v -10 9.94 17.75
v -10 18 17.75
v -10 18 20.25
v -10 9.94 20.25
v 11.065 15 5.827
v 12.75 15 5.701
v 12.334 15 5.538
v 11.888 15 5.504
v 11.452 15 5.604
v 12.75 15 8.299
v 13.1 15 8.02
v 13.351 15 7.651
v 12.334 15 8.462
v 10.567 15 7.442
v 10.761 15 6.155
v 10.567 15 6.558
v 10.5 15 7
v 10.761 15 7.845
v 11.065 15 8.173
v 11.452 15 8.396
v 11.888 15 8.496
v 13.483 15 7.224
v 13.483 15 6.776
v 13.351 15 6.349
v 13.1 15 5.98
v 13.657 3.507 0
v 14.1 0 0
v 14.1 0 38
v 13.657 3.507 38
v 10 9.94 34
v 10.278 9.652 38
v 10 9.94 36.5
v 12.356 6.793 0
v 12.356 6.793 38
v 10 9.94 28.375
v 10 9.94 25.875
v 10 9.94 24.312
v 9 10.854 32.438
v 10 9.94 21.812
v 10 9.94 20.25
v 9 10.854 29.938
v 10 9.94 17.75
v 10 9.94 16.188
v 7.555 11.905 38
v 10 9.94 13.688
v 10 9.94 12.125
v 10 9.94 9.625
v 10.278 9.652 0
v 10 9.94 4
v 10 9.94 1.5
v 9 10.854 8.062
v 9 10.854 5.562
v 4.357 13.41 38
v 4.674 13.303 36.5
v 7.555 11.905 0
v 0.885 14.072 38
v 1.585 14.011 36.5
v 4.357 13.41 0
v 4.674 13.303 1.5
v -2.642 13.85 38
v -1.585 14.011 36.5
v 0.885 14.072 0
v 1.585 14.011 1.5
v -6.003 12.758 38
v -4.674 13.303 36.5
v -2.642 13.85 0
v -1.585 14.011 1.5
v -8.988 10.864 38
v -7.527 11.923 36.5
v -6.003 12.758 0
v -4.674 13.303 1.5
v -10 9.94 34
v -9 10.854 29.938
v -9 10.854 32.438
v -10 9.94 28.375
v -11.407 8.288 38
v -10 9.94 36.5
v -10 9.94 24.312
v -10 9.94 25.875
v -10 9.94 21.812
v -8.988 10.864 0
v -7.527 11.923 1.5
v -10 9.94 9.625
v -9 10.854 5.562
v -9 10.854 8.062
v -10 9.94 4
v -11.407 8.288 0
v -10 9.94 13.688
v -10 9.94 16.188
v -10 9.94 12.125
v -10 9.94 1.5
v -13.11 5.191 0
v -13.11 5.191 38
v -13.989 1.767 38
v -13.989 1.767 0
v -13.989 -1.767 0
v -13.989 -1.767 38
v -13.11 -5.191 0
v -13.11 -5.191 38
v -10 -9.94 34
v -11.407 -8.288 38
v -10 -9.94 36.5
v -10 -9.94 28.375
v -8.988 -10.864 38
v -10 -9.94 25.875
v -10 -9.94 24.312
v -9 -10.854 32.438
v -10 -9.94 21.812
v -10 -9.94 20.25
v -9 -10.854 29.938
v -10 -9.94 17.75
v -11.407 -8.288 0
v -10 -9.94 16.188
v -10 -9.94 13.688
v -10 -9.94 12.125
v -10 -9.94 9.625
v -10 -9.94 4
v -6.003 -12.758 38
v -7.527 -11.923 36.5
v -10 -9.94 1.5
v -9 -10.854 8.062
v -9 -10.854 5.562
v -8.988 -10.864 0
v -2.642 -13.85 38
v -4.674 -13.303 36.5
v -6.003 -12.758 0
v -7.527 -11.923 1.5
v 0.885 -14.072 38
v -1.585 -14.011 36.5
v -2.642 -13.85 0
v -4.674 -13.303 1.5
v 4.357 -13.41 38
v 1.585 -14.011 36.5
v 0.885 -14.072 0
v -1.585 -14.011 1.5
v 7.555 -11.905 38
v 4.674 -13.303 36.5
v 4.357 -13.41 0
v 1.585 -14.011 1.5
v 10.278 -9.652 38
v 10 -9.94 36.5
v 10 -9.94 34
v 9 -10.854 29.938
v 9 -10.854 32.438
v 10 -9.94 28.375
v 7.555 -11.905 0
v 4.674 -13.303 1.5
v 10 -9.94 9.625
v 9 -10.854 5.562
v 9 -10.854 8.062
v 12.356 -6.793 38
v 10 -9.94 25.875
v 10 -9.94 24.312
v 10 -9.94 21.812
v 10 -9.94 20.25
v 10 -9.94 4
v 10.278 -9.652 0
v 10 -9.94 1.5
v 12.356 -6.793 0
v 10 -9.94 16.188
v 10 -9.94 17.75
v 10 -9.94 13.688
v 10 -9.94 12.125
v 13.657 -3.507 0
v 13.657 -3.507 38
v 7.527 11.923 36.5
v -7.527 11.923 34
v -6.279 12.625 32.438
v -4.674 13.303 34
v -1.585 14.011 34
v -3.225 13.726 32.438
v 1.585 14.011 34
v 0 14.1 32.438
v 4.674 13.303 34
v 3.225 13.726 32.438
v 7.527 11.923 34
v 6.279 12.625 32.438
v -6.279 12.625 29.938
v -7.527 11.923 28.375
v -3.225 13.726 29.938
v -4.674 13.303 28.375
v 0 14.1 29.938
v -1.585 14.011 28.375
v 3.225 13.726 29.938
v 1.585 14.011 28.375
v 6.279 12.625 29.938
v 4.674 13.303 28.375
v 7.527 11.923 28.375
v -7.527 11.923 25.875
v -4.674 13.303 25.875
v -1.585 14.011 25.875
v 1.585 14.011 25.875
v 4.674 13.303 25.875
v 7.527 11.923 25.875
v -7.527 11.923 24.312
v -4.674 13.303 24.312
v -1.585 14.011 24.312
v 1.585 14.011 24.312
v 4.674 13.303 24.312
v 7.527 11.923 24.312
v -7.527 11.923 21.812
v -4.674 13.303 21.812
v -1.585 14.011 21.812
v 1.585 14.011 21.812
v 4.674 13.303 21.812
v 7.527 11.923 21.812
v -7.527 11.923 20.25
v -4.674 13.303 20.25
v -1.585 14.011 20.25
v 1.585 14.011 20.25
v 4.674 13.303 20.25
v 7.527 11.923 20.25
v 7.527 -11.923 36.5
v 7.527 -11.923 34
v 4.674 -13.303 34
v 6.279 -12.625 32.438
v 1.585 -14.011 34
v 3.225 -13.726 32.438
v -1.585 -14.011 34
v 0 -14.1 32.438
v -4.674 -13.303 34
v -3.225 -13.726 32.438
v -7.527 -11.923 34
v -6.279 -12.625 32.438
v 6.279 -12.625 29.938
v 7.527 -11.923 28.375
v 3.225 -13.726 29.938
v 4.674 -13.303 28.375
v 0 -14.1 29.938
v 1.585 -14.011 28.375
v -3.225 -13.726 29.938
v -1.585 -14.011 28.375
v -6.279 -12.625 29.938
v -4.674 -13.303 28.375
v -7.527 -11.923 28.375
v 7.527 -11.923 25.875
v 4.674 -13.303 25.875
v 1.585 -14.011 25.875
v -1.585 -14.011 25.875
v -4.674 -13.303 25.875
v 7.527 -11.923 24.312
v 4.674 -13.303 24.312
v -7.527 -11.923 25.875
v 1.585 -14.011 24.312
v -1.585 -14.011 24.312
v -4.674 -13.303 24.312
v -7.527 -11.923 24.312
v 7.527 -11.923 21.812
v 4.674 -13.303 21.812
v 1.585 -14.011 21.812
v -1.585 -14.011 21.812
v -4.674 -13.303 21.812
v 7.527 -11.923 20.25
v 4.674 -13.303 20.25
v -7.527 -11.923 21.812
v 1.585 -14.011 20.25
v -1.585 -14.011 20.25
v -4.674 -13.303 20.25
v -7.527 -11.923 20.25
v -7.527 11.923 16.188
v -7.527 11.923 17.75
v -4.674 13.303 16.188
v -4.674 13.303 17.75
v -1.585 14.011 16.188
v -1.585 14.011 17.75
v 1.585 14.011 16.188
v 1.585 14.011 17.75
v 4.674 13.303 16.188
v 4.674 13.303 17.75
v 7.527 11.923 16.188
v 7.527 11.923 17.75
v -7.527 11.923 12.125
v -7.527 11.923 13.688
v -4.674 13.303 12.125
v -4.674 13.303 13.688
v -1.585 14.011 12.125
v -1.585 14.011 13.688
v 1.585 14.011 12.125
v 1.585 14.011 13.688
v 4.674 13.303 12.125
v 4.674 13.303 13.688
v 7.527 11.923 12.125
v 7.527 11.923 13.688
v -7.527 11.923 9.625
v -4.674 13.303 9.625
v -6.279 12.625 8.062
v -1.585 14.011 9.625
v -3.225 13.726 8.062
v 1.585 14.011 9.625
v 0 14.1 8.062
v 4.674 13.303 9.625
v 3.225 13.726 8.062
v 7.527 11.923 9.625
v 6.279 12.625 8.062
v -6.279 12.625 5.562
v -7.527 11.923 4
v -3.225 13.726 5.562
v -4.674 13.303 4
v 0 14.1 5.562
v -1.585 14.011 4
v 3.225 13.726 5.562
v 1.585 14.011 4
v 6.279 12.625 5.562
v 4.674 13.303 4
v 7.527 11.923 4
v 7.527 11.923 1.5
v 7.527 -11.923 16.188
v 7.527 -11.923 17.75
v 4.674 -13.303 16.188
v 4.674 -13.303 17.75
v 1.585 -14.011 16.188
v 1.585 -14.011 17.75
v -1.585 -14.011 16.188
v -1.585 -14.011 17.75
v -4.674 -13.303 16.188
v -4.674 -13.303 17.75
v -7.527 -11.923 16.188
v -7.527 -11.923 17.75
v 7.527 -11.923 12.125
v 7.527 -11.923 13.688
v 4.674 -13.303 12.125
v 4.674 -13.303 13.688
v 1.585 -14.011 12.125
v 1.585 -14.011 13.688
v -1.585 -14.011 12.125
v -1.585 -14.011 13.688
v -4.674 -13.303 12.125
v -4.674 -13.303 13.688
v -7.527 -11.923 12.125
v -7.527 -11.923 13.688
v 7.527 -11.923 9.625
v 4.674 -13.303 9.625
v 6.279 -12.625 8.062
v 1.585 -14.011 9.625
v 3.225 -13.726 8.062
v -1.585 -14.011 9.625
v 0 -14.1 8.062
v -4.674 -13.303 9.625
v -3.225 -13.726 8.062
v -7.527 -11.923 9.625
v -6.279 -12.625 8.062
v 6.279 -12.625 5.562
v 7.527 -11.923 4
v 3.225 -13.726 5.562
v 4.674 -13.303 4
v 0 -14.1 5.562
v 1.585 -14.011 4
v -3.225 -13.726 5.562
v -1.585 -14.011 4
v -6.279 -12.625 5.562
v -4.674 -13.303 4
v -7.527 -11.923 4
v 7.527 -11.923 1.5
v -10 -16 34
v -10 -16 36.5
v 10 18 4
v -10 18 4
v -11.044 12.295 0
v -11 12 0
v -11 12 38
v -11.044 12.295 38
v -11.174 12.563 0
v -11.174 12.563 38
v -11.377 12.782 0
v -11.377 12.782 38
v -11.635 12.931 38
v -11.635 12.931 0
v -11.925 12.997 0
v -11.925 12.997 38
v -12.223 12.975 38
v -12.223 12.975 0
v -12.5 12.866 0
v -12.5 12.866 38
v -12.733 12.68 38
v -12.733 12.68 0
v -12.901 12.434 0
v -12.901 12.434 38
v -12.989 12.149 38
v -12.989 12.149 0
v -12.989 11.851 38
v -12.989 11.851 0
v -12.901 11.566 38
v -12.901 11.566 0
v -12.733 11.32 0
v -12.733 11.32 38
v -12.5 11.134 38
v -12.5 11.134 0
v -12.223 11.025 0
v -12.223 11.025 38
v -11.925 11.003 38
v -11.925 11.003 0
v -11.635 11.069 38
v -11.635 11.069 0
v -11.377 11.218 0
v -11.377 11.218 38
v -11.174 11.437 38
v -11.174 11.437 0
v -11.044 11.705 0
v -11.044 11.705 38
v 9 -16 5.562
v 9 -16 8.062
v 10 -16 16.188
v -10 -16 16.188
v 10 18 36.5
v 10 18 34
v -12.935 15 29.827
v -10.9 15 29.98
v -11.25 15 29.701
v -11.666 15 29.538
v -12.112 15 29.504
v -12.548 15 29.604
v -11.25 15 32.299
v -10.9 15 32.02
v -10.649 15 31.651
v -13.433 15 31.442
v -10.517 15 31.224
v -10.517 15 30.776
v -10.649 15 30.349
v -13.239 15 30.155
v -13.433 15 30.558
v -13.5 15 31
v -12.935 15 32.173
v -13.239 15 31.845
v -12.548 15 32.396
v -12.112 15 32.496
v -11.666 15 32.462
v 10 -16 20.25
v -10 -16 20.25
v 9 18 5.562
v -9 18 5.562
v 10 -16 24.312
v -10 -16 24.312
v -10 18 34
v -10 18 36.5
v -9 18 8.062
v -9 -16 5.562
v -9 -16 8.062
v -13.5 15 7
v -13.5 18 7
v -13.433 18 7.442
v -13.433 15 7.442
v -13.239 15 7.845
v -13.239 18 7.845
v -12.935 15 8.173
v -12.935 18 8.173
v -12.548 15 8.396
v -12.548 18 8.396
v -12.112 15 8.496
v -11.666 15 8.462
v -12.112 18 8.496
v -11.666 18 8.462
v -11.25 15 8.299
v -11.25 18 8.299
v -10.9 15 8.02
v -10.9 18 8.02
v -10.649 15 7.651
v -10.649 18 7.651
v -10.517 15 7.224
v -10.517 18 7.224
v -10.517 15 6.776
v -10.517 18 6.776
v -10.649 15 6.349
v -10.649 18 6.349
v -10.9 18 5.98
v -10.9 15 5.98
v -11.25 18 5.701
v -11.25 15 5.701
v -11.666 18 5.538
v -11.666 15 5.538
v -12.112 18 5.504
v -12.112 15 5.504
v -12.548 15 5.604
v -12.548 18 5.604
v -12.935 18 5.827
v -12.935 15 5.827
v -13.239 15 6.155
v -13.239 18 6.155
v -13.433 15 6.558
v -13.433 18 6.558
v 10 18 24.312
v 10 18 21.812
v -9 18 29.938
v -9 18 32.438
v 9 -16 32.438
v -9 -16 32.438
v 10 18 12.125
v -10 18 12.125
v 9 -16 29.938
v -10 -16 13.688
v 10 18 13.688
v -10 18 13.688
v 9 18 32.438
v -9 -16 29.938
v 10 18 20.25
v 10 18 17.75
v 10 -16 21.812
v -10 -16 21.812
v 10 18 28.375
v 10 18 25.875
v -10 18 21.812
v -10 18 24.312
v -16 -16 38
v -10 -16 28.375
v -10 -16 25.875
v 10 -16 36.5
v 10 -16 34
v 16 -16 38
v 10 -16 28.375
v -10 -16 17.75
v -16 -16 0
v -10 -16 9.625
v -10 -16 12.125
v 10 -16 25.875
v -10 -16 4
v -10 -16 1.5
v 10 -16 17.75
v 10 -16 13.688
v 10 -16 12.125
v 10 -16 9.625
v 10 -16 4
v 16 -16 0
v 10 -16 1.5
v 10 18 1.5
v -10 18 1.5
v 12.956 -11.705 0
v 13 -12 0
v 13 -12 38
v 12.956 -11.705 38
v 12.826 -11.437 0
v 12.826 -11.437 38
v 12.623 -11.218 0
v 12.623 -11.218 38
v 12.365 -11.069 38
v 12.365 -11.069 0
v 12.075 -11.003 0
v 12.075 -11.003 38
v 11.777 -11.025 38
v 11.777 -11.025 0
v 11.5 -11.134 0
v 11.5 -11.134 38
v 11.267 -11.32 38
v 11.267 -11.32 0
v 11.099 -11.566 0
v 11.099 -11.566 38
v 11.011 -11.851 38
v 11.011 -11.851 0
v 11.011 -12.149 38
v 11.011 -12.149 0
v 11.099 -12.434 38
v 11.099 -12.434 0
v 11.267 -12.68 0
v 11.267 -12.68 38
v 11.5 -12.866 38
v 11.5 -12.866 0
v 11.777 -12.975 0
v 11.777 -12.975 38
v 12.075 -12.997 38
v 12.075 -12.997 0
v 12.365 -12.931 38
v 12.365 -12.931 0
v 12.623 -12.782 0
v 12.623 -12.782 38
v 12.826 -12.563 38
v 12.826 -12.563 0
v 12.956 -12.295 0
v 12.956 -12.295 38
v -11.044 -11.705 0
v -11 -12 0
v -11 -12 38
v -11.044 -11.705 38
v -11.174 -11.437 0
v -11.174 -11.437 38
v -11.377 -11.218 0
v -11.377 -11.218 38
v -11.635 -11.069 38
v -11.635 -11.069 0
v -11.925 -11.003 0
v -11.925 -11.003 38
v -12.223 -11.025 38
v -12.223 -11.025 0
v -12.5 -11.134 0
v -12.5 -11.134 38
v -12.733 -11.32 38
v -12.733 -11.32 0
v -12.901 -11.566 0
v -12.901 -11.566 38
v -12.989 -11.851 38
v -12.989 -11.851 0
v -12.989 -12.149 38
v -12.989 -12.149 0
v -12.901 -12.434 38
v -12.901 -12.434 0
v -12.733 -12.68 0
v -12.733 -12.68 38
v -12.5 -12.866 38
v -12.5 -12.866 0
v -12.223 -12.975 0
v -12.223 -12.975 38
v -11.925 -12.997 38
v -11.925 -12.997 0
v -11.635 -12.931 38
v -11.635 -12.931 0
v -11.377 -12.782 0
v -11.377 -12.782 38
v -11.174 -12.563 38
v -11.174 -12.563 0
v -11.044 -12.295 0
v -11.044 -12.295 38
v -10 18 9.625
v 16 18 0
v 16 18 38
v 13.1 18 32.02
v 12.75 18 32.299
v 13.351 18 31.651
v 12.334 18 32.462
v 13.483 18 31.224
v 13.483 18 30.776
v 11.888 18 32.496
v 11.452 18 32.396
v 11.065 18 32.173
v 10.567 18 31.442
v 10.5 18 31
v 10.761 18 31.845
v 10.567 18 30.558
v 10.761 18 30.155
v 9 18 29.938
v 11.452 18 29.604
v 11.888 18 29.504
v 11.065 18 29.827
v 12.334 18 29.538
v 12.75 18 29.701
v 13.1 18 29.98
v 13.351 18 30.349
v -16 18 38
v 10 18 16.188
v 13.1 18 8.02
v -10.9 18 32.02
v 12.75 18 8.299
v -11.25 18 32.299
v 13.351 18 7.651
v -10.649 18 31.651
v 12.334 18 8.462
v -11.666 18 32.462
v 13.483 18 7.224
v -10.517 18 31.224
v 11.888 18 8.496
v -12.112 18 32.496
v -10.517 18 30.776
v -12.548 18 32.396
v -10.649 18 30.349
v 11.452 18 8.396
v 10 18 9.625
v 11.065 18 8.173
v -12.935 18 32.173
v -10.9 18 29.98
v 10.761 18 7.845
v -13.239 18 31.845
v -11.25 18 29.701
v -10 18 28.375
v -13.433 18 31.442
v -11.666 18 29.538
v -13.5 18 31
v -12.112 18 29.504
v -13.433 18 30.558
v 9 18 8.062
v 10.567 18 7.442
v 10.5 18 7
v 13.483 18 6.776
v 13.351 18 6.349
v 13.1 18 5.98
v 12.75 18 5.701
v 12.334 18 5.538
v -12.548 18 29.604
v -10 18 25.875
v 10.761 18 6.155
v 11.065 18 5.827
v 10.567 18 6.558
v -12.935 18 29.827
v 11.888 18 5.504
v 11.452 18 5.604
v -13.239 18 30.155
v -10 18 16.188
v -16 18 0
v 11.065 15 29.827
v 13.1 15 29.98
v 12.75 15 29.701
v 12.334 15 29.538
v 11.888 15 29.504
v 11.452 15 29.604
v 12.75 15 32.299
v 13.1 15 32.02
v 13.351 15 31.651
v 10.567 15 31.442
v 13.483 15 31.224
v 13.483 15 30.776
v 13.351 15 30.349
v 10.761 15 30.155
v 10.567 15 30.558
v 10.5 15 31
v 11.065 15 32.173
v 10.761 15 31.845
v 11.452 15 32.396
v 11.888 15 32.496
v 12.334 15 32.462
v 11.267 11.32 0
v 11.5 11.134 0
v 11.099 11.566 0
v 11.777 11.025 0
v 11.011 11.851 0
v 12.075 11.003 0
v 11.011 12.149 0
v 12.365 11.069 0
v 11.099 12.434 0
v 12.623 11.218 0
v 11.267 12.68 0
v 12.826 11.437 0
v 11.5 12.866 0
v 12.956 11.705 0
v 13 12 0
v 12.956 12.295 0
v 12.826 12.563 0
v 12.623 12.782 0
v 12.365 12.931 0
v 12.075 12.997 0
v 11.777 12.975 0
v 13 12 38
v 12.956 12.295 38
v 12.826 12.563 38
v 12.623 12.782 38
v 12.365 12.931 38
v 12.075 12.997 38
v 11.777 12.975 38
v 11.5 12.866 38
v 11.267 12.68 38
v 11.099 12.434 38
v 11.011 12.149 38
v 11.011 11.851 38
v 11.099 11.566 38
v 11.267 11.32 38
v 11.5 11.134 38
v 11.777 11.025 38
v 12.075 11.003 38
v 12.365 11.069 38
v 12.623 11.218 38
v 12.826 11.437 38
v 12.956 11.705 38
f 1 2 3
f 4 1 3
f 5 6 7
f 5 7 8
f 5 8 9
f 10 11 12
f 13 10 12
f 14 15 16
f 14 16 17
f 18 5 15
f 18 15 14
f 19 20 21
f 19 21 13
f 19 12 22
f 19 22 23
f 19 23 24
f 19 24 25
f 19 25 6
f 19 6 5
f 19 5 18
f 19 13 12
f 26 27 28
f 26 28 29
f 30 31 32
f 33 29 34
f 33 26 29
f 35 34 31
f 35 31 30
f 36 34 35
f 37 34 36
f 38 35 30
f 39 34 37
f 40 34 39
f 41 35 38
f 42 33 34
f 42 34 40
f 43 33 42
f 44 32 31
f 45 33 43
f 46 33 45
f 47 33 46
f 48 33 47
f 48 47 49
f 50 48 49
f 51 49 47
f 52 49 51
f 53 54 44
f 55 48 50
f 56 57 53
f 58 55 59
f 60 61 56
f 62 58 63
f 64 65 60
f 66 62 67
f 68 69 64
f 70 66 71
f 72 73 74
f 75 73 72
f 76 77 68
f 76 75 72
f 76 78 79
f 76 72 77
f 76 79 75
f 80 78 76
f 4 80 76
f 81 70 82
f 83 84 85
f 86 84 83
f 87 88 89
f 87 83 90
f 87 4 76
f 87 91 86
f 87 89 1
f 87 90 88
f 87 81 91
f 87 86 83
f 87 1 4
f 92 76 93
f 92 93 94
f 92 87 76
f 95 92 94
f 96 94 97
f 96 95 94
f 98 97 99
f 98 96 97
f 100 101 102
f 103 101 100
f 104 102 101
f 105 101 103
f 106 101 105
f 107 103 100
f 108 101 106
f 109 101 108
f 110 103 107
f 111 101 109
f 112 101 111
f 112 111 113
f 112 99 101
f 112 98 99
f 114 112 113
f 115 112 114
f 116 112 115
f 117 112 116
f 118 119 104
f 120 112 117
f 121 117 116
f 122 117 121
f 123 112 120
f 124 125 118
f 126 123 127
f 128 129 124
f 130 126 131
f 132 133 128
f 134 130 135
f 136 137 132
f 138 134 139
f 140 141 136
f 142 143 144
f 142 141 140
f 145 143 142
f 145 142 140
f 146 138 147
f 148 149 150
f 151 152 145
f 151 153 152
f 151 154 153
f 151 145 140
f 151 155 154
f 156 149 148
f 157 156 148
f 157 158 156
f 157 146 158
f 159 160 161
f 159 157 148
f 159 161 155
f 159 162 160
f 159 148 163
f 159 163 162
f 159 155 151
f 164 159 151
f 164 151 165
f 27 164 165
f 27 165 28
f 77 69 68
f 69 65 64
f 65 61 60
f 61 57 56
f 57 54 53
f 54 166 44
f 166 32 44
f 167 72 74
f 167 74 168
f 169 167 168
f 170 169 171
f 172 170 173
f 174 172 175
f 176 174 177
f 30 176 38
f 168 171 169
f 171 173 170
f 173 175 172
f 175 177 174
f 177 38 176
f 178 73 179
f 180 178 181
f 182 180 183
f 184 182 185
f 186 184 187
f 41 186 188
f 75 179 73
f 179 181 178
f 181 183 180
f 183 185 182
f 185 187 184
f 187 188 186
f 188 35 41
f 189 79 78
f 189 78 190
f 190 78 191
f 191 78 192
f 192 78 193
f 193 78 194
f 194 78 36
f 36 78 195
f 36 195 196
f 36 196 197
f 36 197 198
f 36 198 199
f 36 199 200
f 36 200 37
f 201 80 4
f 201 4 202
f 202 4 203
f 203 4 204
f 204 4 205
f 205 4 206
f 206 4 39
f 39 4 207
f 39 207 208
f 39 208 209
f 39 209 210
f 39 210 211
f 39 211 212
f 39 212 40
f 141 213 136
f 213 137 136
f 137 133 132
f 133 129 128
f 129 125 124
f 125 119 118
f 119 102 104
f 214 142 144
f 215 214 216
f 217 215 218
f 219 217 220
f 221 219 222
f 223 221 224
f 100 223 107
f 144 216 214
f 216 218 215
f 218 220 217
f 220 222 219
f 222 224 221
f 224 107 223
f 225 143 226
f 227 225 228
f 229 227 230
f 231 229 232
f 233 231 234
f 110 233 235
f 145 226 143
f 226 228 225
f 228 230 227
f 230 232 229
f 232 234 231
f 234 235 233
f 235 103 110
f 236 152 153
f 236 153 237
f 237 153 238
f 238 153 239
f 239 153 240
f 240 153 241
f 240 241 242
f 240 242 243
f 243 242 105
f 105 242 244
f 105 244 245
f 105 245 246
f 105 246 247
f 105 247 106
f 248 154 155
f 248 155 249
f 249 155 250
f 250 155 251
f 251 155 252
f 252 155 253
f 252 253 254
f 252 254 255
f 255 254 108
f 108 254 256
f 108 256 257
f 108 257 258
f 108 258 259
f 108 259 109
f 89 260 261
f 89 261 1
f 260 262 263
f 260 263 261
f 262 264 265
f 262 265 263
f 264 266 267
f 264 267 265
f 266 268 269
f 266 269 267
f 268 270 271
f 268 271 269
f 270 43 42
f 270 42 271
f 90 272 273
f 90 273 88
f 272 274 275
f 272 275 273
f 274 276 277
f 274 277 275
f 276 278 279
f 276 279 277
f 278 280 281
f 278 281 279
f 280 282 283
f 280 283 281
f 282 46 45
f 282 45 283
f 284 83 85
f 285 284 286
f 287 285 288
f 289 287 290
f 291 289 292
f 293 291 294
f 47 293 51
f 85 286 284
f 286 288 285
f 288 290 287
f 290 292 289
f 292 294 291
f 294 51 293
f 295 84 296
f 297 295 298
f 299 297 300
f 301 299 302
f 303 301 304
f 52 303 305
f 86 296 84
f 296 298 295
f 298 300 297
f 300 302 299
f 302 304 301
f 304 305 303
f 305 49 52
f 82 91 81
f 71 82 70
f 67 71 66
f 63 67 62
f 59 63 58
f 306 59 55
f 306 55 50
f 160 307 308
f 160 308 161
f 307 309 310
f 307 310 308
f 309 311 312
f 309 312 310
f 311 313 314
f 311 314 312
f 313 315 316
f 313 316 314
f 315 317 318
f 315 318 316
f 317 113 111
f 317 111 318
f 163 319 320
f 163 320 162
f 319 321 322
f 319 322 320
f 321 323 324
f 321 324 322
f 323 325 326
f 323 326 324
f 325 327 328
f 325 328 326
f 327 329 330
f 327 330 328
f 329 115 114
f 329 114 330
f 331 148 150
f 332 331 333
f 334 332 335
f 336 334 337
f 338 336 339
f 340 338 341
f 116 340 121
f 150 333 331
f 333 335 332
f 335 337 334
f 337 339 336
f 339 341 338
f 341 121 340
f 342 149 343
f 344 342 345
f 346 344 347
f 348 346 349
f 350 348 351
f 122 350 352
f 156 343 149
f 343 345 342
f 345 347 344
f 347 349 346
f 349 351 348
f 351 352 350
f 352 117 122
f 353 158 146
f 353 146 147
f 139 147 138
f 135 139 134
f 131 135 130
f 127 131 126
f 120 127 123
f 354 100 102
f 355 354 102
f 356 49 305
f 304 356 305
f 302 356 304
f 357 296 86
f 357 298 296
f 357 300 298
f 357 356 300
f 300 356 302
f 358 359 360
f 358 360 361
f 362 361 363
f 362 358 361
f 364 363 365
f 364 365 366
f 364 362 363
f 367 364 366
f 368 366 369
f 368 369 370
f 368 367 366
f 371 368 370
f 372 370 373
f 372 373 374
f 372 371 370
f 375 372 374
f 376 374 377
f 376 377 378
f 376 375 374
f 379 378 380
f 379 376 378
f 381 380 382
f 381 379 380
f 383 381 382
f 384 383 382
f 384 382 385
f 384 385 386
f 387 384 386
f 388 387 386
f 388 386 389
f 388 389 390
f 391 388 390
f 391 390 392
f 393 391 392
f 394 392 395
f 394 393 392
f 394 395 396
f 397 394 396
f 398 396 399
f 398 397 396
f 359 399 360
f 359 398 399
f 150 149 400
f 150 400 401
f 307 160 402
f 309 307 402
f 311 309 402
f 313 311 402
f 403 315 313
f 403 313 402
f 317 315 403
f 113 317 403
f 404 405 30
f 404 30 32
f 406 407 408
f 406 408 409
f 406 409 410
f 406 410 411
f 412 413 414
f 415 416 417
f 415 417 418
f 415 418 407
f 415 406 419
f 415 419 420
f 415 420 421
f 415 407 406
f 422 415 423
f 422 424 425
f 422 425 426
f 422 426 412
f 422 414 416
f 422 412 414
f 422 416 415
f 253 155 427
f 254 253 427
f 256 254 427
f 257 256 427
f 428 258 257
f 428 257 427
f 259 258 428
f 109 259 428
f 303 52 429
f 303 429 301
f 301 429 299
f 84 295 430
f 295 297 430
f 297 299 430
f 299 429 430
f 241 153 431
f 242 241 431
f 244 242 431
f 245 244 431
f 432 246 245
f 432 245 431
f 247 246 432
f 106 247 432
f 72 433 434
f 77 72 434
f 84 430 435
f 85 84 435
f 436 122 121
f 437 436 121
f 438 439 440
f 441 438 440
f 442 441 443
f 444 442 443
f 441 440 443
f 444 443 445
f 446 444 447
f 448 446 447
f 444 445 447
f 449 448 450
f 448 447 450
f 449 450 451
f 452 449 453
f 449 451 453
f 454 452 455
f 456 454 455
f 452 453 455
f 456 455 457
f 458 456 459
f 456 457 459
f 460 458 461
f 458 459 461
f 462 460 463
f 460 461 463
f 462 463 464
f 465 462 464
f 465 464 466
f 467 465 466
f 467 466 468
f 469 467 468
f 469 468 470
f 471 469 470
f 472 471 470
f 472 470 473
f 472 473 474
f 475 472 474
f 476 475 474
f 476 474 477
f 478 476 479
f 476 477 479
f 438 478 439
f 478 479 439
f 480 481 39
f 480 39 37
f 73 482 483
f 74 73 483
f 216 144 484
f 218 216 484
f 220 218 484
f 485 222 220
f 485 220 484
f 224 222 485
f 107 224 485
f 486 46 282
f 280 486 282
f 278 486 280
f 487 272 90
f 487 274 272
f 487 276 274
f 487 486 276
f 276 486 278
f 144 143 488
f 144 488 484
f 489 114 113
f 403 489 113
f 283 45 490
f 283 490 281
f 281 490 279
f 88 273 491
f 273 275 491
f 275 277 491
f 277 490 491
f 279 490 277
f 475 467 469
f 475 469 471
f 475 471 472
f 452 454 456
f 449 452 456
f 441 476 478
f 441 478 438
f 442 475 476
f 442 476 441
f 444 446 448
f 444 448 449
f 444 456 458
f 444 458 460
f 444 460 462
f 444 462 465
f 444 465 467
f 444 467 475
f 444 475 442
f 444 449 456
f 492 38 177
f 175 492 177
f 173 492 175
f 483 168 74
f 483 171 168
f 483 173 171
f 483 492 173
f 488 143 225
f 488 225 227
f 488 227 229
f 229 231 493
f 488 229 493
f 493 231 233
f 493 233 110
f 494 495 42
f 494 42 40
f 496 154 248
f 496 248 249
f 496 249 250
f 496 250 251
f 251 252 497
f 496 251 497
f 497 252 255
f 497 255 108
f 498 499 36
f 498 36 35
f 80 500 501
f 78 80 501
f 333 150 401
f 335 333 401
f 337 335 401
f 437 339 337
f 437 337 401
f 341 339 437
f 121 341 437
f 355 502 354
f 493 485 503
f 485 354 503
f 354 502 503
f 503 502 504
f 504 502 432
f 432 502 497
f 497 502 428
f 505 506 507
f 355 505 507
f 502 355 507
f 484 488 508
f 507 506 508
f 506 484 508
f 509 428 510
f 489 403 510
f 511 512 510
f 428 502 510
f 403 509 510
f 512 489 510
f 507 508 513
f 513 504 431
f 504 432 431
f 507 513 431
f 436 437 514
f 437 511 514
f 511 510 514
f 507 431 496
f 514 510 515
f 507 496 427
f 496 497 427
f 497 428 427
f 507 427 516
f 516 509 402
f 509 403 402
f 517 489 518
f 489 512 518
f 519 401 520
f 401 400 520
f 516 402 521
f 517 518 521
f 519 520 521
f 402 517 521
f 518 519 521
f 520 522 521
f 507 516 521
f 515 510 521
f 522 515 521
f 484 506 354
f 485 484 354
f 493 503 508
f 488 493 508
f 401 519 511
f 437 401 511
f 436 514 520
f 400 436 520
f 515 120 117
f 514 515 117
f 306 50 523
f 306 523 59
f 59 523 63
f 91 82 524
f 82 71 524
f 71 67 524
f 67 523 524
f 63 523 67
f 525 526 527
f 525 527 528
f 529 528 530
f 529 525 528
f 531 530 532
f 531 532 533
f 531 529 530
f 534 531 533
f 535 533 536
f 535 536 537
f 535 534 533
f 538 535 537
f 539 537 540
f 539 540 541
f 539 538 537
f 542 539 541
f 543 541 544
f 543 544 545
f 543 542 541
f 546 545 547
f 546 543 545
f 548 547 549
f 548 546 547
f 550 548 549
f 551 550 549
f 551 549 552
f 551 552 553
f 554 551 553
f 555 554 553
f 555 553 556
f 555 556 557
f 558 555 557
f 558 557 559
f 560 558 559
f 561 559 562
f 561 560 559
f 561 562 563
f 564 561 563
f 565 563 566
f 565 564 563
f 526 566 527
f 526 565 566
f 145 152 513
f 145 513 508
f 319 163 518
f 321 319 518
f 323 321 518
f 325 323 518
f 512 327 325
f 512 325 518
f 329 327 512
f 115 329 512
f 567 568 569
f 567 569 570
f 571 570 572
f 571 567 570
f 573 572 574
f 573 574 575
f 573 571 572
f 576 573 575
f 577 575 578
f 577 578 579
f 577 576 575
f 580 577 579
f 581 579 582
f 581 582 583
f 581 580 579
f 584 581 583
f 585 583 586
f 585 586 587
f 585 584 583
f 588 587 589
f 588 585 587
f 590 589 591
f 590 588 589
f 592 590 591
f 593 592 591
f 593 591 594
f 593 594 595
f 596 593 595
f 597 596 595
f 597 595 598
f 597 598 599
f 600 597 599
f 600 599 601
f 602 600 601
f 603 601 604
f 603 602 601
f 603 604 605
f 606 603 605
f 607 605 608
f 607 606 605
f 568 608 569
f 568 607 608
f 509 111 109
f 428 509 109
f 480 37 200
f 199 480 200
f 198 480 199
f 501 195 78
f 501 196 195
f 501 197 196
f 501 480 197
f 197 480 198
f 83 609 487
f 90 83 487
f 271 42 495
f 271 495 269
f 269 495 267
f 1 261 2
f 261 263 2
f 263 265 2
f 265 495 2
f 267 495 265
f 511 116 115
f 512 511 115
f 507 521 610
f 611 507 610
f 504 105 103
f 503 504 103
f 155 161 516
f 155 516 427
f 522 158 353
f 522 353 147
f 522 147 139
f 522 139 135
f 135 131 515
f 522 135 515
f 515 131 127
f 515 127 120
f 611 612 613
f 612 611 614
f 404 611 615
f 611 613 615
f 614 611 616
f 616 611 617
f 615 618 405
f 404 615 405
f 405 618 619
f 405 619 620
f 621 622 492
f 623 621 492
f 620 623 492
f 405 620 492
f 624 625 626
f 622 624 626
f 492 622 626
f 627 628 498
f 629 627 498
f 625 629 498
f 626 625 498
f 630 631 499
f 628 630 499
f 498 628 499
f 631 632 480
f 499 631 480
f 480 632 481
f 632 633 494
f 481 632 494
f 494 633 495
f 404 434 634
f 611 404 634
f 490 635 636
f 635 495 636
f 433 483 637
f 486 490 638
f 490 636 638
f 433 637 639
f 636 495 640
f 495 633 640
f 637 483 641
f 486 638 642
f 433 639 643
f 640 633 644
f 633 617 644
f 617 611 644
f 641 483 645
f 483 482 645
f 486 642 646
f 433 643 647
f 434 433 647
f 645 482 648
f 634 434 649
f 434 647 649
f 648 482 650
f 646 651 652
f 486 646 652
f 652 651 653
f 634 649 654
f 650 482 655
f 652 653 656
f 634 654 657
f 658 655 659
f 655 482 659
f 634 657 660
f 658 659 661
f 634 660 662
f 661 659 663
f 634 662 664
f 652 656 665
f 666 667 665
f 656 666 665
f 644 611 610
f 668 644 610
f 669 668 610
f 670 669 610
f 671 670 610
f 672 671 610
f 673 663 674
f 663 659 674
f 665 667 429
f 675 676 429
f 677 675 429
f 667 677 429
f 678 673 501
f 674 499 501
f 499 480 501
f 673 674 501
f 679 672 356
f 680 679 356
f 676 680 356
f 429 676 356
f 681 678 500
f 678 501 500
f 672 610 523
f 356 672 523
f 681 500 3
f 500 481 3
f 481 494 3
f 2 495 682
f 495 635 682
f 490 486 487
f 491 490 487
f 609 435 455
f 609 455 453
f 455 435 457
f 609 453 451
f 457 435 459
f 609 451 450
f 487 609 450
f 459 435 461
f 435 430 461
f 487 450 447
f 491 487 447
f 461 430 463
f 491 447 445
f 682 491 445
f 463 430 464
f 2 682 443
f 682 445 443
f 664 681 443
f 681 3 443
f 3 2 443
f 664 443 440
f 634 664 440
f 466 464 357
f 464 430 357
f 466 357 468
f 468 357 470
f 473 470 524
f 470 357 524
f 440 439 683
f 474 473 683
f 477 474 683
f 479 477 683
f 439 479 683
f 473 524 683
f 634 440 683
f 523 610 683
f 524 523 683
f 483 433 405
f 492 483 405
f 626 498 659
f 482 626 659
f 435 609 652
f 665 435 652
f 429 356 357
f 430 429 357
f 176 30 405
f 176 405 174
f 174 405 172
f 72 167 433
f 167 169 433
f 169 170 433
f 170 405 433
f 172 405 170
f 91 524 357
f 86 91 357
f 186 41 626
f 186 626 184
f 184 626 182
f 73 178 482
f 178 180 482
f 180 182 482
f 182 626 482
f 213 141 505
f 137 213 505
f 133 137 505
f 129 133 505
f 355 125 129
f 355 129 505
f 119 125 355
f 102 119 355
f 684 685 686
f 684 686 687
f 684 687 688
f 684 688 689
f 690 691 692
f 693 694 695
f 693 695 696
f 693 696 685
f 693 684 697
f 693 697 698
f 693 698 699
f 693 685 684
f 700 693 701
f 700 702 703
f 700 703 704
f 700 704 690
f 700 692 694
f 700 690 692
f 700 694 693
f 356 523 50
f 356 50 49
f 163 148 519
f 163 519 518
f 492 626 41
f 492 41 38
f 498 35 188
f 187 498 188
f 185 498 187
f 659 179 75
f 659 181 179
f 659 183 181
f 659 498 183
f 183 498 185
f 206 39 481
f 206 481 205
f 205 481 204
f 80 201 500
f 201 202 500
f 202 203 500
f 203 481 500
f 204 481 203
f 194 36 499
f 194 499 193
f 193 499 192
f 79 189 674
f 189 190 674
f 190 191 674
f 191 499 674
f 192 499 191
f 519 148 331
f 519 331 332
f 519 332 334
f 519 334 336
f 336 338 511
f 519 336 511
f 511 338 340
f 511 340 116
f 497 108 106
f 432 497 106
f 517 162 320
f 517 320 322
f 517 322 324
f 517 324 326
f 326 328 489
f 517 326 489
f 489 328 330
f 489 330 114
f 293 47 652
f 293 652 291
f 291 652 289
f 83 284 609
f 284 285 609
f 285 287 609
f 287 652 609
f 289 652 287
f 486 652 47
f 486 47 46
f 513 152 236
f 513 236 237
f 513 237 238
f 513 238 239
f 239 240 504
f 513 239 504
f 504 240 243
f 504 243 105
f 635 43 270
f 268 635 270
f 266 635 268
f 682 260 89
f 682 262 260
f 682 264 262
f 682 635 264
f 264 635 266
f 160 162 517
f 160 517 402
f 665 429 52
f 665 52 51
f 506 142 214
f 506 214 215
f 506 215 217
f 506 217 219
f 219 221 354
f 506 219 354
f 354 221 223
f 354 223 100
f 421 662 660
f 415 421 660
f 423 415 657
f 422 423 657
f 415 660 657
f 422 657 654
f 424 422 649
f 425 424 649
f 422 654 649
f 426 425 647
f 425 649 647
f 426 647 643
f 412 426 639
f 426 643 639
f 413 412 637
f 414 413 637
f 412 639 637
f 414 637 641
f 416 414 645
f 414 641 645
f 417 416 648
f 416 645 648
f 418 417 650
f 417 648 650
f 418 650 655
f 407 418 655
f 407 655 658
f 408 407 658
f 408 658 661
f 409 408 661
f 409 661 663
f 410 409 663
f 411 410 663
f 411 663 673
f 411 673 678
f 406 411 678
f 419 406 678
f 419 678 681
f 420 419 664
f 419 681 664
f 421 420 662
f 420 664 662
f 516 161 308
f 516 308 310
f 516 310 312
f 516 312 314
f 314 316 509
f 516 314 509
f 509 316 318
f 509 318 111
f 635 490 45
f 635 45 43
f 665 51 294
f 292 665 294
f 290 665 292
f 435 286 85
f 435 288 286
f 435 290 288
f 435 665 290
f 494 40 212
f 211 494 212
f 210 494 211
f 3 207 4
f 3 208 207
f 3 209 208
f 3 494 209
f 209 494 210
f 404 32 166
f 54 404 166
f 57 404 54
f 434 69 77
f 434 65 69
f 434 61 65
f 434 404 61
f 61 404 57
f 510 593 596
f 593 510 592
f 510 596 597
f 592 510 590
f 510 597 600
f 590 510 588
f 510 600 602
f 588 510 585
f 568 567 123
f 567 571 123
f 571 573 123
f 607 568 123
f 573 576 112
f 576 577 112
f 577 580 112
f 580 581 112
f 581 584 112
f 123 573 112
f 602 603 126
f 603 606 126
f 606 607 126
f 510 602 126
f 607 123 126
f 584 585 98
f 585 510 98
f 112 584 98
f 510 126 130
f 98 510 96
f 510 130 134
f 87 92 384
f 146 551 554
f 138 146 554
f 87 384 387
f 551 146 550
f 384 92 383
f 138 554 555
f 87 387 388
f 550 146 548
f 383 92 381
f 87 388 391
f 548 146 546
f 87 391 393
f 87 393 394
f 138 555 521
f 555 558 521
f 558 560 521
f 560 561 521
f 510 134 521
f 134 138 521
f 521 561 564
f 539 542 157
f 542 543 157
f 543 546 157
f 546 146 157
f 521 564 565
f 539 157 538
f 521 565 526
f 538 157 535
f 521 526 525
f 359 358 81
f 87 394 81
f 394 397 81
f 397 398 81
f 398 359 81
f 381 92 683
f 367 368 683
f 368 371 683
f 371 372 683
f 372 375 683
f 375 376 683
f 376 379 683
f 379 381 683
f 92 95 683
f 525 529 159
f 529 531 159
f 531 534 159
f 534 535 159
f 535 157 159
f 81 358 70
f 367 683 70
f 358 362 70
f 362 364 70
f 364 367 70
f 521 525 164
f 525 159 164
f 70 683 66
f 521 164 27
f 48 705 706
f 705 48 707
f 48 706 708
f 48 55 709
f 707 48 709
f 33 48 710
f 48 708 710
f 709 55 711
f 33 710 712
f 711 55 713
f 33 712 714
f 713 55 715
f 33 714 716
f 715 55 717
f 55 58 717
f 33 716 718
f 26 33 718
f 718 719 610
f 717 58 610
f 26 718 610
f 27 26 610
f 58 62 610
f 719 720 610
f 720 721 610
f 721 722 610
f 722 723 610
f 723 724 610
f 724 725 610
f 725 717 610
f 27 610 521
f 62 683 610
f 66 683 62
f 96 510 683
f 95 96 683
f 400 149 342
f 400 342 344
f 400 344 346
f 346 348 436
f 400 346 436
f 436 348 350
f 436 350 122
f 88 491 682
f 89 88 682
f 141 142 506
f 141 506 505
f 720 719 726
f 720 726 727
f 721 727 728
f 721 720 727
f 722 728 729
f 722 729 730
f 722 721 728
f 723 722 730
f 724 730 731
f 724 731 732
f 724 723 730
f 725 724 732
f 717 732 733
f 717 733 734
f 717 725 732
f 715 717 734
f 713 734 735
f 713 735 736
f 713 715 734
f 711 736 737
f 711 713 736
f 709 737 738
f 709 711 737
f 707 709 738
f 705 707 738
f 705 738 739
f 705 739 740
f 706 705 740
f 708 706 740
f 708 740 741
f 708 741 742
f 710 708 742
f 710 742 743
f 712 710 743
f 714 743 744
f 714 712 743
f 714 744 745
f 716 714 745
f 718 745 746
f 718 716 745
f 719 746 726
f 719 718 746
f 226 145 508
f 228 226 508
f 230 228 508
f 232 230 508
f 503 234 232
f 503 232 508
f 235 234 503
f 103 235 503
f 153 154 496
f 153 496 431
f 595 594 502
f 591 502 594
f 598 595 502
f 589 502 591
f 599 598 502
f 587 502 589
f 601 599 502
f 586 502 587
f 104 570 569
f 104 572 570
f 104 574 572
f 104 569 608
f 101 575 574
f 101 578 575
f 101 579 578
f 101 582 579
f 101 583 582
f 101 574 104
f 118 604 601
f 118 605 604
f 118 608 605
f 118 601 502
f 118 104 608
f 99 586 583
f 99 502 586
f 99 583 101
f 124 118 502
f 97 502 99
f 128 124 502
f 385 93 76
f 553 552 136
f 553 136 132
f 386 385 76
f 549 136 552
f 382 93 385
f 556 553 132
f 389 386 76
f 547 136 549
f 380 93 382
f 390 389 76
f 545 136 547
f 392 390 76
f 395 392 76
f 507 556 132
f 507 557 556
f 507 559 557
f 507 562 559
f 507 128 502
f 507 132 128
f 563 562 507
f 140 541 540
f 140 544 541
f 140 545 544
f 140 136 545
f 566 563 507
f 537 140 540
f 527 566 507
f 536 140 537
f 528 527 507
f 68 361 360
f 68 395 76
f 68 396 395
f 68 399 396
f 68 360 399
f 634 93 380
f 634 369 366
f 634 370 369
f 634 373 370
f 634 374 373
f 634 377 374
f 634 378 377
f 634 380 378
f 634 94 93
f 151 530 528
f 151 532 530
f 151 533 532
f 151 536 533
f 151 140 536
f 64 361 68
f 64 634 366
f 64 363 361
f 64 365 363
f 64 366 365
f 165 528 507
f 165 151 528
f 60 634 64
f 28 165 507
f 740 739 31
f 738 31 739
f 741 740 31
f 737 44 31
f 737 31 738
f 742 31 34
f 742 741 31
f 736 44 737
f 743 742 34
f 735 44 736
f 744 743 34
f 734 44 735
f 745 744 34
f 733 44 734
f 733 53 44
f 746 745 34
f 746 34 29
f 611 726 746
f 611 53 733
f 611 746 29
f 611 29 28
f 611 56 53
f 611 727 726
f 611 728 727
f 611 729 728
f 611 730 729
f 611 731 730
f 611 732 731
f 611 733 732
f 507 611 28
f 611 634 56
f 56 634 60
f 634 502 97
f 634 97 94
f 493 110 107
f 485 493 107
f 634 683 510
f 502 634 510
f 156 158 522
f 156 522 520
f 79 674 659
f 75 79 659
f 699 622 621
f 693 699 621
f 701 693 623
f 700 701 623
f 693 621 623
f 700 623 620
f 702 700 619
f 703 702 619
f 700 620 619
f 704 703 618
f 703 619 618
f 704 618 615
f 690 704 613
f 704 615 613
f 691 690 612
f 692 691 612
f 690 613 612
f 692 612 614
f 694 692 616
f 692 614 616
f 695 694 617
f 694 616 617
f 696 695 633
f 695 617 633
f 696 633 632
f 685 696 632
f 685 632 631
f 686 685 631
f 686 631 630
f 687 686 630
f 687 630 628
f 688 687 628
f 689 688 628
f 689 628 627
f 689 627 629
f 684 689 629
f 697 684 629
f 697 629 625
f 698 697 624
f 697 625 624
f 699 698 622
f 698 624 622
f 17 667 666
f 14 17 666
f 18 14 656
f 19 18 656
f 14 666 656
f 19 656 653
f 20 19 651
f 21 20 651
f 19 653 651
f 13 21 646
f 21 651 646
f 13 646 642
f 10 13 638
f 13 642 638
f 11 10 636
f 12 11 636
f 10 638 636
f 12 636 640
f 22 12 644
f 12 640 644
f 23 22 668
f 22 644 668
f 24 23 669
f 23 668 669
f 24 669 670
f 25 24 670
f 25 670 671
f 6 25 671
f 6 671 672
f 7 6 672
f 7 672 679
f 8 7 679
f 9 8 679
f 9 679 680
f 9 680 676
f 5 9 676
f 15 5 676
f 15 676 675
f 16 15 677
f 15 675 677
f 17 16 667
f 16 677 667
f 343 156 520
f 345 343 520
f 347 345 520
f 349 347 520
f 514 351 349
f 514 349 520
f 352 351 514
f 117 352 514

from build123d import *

# Parameters (mm, degrees)
SKETCH_R        = 14.1
SKETCH_R_2      = 1
PAD_DEPTH       = 38
SKETCH001_R     = 1.5
POCKET_DEPTH    = 3
SKETCH002_W     = 20
SKETCH002_H     = 2.5
SKETCH002_W_2   = 18
POCKET001_DEPTH = 34.001


with BuildPart() as part:
    # Sketch → Pad (new body)
    with BuildSketch(Plane.XY):
        Polygon((16, -16), (16, 16), (16, 18), (-16, 18), (-16, 16), (-16, -16), align=None)
        Circle(SKETCH_R, mode=Mode.SUBTRACT)
        with Locations((-12, 12)):
            Circle(SKETCH_R_2, mode=Mode.SUBTRACT)
        with Locations((12, 12)):
            Circle(SKETCH_R_2, mode=Mode.SUBTRACT)
        with Locations((12, -12)):
            Circle(SKETCH_R_2, mode=Mode.SUBTRACT)
        with Locations((-12, -12)):
            Circle(SKETCH_R_2, mode=Mode.SUBTRACT)
    extrude(amount=PAD_DEPTH)

    # Sketch001 (on Face5 of Pad) → Pocket (cut)
    with BuildSketch(Plane(origin=(0, 18, 0), x_dir=(-1, 0, 0), z_dir=(0, 1, 0))):
        with Locations((-12, 31)):
            Circle(SKETCH001_R)
        with Locations((12, 31)):
            Circle(SKETCH001_R)
        with Locations((12, 7)):
            Circle(SKETCH001_R)
        with Locations((-12, 7)):
            Circle(SKETCH001_R)
    extrude(amount=-POCKET_DEPTH, mode=Mode.SUBTRACT)

    # Sketch002 (on Face6 of Pocket) → Pocket001 (cut, through all)
    with BuildSketch(Plane(origin=(0, 18, 0), x_dir=(-1, 0, 0), z_dir=(0, 1, 0))):
        with Locations((0, 27.125)):
            Rectangle(SKETCH002_W, SKETCH002_H)
        with Locations((0, 23.0625)):
            Rectangle(SKETCH002_W, SKETCH002_H)
        with Locations((0, 19)):
            Rectangle(SKETCH002_W, SKETCH002_H)
        with Locations((0, 14.9375)):
            Rectangle(SKETCH002_W, SKETCH002_H)
        with Locations((0, 10.875)):
            Rectangle(SKETCH002_W, SKETCH002_H)
        with Locations((0, 6.8125)):
            Rectangle(SKETCH002_W_2, SKETCH002_H)
        with Locations((0, 31.1875)):
            Rectangle(SKETCH002_W_2, SKETCH002_H)
        with Locations((0, 2.75)):
            Rectangle(SKETCH002_W, SKETCH002_H)
        with Locations((0, 35.25)):
            Rectangle(SKETCH002_W, SKETCH002_H)
    extrude(amount=-POCKET001_DEPTH, mode=Mode.SUBTRACT)


solid = part.part
